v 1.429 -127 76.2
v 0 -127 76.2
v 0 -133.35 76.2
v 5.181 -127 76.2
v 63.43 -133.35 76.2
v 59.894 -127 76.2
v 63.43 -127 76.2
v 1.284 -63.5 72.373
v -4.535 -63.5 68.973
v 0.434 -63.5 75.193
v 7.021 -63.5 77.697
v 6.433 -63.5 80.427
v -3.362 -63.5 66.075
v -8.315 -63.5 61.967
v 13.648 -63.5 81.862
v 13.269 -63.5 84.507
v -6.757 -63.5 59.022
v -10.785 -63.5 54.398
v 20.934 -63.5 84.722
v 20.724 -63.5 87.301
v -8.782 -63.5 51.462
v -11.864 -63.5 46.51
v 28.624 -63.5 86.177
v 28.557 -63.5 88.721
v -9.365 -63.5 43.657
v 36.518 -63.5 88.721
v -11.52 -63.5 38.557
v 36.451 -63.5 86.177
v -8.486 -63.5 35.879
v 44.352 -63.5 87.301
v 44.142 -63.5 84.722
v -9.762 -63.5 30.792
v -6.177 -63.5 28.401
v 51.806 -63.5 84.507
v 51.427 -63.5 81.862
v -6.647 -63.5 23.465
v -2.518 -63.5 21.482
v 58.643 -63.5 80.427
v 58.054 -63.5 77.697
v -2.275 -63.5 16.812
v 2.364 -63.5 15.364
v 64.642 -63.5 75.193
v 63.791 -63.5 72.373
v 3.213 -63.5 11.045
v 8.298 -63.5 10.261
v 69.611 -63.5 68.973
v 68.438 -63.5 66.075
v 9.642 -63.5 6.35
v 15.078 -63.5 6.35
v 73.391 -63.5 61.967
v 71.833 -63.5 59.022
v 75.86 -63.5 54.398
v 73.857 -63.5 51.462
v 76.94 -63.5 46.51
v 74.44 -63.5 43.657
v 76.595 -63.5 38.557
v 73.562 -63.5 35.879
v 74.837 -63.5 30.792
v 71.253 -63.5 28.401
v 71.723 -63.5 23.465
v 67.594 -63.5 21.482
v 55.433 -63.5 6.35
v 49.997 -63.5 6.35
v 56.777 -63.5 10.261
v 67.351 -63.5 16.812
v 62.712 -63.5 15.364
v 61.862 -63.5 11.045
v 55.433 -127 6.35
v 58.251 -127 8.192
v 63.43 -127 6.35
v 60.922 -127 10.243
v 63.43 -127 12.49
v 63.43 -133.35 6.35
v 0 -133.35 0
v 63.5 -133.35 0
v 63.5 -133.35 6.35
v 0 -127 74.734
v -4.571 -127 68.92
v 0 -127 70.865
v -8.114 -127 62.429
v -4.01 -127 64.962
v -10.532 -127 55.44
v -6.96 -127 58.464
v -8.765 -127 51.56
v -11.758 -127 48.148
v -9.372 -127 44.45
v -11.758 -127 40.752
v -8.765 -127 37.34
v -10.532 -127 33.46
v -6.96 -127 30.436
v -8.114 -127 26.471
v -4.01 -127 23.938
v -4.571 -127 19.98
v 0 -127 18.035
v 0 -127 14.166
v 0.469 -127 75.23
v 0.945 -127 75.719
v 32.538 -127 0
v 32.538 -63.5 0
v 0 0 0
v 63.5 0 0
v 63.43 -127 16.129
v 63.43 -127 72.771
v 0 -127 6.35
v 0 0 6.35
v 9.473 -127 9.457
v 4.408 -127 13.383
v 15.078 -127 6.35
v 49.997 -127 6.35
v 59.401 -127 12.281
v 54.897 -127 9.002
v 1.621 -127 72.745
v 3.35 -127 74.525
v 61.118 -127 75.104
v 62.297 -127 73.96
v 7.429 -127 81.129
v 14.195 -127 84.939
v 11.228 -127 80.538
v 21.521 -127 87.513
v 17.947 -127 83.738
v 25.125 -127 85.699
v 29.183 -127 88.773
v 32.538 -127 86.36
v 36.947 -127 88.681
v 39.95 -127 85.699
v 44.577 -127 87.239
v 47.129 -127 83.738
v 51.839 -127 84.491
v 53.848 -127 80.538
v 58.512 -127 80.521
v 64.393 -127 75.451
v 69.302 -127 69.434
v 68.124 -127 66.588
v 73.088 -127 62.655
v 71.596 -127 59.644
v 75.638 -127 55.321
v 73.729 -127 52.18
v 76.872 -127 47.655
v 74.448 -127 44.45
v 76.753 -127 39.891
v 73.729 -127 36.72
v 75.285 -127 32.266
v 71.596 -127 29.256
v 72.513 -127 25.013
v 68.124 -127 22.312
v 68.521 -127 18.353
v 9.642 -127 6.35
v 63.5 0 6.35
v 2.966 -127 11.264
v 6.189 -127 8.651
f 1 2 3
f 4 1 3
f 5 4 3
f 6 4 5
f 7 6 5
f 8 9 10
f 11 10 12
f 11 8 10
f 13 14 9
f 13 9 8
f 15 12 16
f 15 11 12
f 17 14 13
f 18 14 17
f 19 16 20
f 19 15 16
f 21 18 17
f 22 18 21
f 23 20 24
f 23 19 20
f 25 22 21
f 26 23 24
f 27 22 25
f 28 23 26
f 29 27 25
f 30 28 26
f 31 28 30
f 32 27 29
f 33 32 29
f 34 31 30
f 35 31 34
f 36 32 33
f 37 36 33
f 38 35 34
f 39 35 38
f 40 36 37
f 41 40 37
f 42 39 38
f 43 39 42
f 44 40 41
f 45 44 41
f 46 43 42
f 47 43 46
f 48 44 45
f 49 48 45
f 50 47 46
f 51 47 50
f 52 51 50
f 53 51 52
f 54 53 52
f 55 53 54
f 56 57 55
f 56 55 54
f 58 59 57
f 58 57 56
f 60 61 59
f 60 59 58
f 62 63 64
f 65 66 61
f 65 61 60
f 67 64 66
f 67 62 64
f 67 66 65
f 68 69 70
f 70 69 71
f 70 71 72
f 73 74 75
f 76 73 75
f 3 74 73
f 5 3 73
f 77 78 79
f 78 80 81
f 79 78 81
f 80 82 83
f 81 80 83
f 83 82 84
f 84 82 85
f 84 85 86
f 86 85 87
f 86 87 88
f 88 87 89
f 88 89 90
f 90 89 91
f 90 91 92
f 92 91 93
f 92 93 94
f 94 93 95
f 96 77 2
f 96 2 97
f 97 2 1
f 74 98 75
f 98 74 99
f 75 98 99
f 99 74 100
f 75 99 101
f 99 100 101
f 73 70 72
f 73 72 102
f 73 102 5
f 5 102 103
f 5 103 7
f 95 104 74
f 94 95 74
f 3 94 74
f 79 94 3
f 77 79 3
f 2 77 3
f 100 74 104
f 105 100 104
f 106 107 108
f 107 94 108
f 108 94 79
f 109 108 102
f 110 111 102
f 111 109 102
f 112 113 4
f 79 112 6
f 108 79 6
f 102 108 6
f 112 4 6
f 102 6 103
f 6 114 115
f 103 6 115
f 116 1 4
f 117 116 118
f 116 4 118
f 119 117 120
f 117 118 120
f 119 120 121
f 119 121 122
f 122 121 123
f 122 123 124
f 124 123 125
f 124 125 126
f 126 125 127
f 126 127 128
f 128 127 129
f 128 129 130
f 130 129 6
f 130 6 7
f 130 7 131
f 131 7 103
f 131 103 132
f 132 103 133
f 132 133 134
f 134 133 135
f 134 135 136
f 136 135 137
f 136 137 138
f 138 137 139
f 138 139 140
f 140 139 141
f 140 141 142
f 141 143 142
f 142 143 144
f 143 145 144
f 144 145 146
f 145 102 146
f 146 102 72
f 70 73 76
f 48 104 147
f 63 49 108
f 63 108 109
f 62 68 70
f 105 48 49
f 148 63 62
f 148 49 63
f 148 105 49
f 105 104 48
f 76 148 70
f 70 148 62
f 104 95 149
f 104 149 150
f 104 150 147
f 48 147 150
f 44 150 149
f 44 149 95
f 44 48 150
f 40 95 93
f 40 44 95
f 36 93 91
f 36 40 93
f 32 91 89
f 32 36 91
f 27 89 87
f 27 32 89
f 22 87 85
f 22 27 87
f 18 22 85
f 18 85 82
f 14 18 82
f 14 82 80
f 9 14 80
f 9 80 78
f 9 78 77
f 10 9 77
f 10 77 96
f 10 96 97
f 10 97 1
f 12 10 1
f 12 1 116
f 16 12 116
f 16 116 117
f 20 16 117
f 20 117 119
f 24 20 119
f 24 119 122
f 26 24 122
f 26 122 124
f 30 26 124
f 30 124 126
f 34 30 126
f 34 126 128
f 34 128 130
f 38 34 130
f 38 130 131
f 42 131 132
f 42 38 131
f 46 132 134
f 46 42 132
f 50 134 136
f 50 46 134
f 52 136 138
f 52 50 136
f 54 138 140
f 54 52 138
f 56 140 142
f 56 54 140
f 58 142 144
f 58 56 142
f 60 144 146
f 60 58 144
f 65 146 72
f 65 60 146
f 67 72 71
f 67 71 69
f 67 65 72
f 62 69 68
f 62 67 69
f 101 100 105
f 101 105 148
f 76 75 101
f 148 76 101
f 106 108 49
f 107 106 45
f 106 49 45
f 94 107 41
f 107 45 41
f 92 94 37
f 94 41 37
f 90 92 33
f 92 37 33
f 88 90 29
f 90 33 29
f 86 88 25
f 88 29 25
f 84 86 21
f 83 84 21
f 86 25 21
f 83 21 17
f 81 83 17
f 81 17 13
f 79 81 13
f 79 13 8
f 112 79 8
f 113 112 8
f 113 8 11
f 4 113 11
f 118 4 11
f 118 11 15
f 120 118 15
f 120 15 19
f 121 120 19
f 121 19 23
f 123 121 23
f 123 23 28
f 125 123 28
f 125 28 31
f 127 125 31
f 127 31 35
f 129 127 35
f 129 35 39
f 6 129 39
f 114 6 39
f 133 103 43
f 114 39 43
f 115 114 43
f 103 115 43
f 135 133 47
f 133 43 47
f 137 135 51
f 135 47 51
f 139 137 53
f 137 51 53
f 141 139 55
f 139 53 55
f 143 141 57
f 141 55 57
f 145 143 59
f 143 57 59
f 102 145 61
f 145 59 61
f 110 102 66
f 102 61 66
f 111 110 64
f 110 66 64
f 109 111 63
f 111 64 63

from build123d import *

# Parameters (mm, degrees)
SKETCH1_W           = 63.5
SKETCH1_H           = 127
BOSS_EXTRUDE1_DEPTH = 6.35
SKETCH2_W           = 63.430323736
SKETCH2_H           = 76.2
BOSS_EXTRUDE2_DEPTH = 6.35
SKETCH3_W           = 63.5
SKETCH3_H           = 6.35
BOSS_EXTRUDE3_DEPTH = 6.35
SKETCH4_R           = 44.45
SKETCH4_R_2         = 41.91
BOSS_EXTRUDE4_DEPTH = 63.5


with BuildPart() as part:
    # Sketch1 → Boss-Extrude1 (new body)
    with BuildSketch(Plane.XY):
        with Locations((31.75, -63.5)):
            Rectangle(SKETCH1_W, SKETCH1_H)
    extrude(amount=BOSS_EXTRUDE1_DEPTH)



with BuildPart() as body_2:
    # Sketch2 → Boss-Extrude2 (new body)
    with BuildSketch(Plane.XZ.offset(127)):
        with Locations((31.715161868, 38.1)):
            Rectangle(SKETCH2_W, SKETCH2_H)
    extrude(amount=BOSS_EXTRUDE2_DEPTH)


with BuildPart() as part_1:
    add(part.part)

    add(body_2.part)  # Boss-Extrude3 merges body 2
    # Sketch3 → Boss-Extrude3 (add)
    with BuildSketch(Plane.XZ.offset(127)):
        with Locations((31.75, 3.175)):
            Rectangle(SKETCH3_W, SKETCH3_H)
    extrude(amount=BOSS_EXTRUDE3_DEPTH)

    # Sketch4 → Boss-Extrude4 (add)
    with BuildSketch(Plane(origin=(0, -63.5, 0), x_dir=(1, 0, 0), z_dir=(0, 1, 0))):
        with Locations((32.537747745, -44.45)):
            Circle(SKETCH4_R)
        with Locations((32.537747745, -44.45)):
            Circle(SKETCH4_R_2, mode=Mode.SUBTRACT)
    extrude(amount=-BOSS_EXTRUDE4_DEPTH)


solid = part_1.part
